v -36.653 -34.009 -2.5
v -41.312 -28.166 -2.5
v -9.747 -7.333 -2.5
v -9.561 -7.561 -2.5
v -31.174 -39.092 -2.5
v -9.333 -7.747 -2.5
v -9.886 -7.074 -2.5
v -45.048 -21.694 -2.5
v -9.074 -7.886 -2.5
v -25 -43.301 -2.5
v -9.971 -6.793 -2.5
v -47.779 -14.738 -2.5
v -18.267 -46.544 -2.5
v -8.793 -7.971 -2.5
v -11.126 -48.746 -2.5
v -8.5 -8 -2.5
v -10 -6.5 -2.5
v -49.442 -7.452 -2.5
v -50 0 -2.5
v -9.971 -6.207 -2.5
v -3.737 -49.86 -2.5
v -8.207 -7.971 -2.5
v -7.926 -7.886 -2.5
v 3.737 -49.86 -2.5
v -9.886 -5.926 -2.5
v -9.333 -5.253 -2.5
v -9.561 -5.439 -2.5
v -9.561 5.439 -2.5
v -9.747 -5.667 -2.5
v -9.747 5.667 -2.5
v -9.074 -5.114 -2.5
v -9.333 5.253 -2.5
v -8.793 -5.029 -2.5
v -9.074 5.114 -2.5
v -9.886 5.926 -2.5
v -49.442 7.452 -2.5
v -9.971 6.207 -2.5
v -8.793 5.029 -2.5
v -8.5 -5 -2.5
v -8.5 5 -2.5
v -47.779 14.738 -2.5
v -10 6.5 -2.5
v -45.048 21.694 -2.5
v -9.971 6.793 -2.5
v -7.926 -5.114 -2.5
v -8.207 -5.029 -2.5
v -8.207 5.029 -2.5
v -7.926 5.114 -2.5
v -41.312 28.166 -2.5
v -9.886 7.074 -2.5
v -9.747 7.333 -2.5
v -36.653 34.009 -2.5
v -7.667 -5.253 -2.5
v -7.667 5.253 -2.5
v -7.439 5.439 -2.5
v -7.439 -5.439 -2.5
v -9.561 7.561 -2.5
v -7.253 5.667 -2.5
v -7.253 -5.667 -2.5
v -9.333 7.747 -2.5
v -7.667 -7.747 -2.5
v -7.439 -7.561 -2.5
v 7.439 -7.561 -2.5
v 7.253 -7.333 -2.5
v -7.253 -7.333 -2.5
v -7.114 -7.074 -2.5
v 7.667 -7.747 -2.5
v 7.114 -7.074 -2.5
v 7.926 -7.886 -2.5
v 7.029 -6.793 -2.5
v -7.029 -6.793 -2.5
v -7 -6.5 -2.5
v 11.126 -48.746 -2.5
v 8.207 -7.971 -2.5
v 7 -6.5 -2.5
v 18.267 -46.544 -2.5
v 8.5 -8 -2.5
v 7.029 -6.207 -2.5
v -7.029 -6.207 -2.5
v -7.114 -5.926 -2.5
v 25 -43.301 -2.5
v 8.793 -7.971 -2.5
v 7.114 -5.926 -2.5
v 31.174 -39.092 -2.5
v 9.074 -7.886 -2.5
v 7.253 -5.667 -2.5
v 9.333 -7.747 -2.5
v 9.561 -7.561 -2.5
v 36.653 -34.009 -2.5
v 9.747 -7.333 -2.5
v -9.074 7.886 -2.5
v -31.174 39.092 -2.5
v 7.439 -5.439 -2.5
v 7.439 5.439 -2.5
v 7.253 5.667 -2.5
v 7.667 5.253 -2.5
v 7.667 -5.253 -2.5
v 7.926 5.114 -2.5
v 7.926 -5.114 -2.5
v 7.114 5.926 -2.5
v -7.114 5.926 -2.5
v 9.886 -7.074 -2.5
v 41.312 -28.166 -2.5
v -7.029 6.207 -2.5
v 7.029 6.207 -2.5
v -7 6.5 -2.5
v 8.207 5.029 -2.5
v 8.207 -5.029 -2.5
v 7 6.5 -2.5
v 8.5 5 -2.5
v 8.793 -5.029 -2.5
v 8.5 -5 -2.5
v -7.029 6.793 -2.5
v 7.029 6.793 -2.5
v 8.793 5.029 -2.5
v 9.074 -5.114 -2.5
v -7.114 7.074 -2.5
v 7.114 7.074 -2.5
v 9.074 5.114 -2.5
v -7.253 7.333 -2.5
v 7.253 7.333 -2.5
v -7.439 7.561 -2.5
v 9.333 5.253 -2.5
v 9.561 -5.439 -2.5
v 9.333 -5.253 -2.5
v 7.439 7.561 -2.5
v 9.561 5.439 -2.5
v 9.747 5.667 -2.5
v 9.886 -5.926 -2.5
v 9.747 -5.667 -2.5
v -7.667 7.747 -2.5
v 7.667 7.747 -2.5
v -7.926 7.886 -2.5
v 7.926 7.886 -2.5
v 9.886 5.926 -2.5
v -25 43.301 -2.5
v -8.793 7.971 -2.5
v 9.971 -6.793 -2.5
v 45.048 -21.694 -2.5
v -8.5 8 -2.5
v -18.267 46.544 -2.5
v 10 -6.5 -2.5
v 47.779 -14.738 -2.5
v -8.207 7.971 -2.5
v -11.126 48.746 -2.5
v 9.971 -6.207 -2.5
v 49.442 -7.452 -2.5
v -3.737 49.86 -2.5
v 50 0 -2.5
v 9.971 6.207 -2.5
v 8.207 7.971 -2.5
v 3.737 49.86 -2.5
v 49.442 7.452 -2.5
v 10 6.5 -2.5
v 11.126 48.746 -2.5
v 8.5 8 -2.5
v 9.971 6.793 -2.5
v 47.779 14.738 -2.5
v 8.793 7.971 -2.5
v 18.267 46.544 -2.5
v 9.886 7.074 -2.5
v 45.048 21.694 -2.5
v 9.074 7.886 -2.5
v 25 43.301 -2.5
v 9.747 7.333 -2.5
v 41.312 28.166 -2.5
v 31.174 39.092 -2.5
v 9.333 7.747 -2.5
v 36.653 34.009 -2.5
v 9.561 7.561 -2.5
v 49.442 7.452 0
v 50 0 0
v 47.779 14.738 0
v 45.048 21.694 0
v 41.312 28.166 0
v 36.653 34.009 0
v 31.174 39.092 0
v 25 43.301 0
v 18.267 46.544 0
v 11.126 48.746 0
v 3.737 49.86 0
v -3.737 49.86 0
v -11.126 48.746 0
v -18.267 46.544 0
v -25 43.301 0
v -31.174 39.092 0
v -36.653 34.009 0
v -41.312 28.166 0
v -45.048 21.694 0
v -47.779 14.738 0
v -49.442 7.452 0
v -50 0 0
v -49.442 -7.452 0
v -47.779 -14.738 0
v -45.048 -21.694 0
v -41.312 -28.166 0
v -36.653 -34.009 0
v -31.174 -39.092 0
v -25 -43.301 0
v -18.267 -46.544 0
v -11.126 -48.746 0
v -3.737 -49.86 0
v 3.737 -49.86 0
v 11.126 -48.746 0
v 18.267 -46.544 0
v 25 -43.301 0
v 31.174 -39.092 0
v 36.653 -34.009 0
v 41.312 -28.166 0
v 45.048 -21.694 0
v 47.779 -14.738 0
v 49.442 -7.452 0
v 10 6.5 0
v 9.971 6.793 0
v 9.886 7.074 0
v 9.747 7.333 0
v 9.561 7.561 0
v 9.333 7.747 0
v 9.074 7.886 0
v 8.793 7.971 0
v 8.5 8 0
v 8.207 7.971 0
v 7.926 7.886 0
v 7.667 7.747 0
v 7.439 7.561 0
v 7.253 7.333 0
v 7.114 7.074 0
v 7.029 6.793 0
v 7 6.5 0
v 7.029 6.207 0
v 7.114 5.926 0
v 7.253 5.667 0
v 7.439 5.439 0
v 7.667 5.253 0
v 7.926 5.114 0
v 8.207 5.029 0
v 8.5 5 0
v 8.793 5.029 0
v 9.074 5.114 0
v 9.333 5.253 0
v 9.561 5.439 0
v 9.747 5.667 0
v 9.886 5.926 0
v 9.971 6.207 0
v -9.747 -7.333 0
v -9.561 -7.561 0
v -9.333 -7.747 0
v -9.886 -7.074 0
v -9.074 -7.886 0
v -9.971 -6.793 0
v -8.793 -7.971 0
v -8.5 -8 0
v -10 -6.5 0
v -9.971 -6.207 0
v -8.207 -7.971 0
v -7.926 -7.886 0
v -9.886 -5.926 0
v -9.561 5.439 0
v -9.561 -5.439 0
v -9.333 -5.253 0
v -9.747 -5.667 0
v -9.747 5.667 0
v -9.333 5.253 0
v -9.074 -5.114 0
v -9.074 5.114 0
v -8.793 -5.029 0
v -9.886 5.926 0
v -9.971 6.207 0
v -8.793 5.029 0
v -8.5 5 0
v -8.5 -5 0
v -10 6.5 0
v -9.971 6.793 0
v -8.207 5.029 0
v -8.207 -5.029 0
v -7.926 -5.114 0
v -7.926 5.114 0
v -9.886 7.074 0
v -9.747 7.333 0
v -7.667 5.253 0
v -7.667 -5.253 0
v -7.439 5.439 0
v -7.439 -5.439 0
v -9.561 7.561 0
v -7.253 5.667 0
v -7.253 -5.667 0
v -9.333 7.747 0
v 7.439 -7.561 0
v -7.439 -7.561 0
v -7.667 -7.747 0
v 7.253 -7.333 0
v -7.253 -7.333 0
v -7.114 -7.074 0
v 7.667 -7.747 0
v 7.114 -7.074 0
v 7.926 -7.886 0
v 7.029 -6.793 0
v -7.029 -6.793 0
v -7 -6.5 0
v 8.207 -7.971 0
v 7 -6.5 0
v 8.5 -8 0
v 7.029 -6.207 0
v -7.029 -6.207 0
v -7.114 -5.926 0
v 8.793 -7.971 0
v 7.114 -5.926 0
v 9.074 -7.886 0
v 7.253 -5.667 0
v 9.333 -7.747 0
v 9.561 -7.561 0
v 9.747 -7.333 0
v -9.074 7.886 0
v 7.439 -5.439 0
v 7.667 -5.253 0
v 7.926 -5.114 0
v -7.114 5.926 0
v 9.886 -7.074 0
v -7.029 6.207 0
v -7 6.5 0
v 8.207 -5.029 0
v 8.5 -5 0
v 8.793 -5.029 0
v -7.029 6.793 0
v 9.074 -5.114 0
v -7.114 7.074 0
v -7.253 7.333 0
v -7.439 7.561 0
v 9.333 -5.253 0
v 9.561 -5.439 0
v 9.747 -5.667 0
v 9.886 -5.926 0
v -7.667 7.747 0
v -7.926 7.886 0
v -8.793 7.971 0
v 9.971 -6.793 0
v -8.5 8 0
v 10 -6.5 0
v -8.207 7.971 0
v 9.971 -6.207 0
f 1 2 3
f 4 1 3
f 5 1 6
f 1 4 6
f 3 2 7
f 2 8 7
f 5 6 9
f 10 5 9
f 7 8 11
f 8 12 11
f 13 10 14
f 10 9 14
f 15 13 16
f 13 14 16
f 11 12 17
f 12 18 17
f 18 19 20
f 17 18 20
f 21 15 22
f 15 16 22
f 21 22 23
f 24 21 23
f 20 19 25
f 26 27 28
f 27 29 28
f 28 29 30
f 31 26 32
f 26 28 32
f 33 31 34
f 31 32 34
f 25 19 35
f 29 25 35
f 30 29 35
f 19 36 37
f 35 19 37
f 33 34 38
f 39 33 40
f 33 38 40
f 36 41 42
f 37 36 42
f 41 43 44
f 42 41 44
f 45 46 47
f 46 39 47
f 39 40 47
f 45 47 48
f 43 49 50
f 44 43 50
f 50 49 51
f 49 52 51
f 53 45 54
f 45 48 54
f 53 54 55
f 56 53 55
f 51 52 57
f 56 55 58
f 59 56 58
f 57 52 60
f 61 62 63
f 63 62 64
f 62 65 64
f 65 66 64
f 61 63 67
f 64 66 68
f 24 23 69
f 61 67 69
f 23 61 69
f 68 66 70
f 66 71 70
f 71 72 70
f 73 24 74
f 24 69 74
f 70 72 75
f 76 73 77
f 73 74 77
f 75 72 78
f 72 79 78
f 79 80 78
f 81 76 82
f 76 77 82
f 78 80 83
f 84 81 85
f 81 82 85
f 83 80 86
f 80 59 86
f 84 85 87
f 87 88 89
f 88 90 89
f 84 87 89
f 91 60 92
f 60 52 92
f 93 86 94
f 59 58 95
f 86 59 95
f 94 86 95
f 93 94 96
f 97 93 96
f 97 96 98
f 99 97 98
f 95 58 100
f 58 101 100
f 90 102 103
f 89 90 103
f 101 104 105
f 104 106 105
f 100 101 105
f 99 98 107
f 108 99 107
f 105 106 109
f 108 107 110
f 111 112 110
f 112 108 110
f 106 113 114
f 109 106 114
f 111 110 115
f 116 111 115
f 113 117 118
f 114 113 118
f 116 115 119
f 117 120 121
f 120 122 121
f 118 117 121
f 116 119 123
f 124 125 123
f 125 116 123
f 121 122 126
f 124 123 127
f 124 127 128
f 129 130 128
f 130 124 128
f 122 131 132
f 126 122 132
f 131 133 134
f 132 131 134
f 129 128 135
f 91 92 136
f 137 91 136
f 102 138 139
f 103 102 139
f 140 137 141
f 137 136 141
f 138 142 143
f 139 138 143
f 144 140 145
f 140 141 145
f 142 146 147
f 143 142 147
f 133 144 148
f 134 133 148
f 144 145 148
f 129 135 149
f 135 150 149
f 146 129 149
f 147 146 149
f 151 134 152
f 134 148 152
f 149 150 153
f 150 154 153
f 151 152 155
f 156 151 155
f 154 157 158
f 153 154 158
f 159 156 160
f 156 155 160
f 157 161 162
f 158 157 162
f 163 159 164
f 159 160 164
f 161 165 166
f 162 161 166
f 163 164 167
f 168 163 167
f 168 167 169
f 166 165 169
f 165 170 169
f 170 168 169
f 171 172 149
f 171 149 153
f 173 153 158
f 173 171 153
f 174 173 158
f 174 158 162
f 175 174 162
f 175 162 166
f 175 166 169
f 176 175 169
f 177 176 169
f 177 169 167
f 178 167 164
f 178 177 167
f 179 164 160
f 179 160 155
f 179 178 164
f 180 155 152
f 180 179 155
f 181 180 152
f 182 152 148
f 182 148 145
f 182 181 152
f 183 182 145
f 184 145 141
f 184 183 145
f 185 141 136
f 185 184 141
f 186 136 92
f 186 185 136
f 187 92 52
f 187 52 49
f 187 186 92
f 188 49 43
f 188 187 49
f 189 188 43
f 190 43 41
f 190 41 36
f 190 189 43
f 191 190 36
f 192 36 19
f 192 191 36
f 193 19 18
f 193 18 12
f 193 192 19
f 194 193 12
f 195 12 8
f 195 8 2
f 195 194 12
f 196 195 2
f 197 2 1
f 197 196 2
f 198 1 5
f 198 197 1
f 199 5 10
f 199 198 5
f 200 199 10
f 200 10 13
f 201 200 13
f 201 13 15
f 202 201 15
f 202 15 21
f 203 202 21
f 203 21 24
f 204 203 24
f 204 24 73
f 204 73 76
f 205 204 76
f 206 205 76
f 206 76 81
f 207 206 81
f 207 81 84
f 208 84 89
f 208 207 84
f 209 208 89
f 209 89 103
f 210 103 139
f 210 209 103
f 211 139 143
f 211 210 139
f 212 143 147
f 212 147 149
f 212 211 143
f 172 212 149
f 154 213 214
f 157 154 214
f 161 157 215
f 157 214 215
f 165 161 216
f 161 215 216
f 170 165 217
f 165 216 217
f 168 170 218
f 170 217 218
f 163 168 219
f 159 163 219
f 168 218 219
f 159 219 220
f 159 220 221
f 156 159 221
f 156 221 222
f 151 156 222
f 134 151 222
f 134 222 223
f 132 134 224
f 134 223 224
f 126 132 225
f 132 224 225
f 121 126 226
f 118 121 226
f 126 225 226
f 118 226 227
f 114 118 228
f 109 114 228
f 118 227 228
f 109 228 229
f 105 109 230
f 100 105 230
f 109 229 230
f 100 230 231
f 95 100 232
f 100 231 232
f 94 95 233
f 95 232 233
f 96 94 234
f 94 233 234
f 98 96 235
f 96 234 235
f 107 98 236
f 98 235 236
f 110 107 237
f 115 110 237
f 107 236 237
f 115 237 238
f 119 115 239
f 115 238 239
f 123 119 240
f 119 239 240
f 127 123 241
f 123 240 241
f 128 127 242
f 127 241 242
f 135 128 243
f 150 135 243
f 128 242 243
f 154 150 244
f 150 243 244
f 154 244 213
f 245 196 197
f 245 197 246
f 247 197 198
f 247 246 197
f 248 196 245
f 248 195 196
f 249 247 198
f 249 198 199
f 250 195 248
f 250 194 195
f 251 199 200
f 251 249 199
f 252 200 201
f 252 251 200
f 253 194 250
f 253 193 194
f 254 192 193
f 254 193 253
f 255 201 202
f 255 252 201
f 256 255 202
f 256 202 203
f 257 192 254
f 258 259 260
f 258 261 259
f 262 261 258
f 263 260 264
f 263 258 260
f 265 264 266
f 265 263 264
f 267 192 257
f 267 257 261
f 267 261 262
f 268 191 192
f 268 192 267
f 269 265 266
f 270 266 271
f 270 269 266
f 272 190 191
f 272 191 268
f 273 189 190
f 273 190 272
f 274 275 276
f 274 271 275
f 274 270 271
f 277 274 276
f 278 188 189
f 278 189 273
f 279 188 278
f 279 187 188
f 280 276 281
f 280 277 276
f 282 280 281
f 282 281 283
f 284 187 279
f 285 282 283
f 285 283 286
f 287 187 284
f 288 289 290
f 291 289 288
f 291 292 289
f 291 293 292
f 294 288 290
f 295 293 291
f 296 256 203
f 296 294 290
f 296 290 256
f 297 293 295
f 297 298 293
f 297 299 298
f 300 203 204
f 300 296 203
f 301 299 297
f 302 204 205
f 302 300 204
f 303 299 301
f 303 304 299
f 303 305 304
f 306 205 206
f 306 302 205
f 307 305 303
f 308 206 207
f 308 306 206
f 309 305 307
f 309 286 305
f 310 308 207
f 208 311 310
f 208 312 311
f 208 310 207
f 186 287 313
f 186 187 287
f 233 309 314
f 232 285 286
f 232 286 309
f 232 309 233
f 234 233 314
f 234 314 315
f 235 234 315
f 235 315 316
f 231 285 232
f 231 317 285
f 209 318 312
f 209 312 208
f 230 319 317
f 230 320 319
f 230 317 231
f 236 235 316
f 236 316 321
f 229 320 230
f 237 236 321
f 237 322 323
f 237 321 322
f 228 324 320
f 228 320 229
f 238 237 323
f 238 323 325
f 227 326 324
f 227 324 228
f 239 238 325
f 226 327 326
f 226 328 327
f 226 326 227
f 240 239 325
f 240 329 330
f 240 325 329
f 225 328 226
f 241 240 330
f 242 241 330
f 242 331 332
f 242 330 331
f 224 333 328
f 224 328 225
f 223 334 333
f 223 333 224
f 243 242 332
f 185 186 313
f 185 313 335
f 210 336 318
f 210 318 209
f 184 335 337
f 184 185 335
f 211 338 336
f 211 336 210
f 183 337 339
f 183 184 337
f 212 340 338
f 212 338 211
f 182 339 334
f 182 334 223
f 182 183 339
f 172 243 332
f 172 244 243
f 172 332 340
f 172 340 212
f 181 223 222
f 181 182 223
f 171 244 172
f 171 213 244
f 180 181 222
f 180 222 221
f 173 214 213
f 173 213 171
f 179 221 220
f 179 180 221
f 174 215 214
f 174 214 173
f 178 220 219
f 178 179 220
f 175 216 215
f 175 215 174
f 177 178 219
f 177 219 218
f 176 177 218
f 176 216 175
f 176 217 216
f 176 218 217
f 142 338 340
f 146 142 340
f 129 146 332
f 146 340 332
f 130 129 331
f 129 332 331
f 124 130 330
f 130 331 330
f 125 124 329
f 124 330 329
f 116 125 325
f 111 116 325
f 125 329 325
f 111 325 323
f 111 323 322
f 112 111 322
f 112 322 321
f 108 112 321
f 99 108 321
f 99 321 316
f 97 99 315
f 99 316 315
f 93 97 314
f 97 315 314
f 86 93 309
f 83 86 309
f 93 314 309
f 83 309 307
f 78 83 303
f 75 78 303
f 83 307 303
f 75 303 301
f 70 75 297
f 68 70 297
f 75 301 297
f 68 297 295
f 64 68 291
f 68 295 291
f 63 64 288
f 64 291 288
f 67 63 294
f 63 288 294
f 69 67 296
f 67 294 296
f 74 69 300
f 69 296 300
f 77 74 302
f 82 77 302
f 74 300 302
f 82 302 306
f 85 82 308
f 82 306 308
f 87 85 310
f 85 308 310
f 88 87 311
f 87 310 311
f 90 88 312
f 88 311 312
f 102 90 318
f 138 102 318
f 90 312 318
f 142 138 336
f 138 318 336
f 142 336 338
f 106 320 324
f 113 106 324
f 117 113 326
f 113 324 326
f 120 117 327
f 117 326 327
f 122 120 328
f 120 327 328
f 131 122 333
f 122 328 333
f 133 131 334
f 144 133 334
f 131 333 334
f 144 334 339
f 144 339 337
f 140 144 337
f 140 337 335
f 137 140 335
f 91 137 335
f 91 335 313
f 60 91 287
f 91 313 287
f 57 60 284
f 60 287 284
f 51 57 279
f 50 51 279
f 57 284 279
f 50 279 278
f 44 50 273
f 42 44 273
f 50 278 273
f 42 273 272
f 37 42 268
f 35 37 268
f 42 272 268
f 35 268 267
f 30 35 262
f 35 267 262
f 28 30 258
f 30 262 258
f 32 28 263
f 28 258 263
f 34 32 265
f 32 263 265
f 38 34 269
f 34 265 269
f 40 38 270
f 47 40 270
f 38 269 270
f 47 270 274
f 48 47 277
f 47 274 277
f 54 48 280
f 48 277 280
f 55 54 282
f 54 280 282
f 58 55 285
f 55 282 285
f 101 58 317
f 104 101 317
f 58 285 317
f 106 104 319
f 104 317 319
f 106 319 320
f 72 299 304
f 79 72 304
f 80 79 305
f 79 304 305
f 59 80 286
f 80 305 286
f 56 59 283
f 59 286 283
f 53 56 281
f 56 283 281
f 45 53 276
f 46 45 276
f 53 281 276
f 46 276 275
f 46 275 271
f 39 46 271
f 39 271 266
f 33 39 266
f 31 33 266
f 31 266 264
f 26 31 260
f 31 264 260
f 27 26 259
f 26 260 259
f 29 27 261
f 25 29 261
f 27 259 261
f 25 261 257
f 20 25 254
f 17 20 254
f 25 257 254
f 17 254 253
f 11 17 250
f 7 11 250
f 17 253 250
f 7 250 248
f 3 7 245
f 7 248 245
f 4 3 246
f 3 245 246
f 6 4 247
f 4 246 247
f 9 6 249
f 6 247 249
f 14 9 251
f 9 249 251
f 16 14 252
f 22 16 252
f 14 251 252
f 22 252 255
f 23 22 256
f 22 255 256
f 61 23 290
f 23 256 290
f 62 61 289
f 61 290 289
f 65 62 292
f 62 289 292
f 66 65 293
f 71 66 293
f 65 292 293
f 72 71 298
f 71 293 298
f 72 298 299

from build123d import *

# Parameters (mm, degrees)
F0_R     = 50
F0_R_2   = 1.5
F1_DEPTH = 2.5


with BuildPart() as f1:
    # F0 (on Top) → F1 (new body)
    with BuildSketch(Plane.XY):
        Circle(F0_R)
        with Locations((-8.5, -6.5)):
            Circle(F0_R_2, mode=Mode.SUBTRACT)
        with Locations((8.5, -6.5)):
            Circle(F0_R_2, mode=Mode.SUBTRACT)
        with Locations((-8.5, 6.5)):
            Circle(F0_R_2, mode=Mode.SUBTRACT)
        with Locations((8.5, 6.5)):
            Circle(F0_R_2, mode=Mode.SUBTRACT)
    extrude(amount=-F1_DEPTH)


solid = f1.part
